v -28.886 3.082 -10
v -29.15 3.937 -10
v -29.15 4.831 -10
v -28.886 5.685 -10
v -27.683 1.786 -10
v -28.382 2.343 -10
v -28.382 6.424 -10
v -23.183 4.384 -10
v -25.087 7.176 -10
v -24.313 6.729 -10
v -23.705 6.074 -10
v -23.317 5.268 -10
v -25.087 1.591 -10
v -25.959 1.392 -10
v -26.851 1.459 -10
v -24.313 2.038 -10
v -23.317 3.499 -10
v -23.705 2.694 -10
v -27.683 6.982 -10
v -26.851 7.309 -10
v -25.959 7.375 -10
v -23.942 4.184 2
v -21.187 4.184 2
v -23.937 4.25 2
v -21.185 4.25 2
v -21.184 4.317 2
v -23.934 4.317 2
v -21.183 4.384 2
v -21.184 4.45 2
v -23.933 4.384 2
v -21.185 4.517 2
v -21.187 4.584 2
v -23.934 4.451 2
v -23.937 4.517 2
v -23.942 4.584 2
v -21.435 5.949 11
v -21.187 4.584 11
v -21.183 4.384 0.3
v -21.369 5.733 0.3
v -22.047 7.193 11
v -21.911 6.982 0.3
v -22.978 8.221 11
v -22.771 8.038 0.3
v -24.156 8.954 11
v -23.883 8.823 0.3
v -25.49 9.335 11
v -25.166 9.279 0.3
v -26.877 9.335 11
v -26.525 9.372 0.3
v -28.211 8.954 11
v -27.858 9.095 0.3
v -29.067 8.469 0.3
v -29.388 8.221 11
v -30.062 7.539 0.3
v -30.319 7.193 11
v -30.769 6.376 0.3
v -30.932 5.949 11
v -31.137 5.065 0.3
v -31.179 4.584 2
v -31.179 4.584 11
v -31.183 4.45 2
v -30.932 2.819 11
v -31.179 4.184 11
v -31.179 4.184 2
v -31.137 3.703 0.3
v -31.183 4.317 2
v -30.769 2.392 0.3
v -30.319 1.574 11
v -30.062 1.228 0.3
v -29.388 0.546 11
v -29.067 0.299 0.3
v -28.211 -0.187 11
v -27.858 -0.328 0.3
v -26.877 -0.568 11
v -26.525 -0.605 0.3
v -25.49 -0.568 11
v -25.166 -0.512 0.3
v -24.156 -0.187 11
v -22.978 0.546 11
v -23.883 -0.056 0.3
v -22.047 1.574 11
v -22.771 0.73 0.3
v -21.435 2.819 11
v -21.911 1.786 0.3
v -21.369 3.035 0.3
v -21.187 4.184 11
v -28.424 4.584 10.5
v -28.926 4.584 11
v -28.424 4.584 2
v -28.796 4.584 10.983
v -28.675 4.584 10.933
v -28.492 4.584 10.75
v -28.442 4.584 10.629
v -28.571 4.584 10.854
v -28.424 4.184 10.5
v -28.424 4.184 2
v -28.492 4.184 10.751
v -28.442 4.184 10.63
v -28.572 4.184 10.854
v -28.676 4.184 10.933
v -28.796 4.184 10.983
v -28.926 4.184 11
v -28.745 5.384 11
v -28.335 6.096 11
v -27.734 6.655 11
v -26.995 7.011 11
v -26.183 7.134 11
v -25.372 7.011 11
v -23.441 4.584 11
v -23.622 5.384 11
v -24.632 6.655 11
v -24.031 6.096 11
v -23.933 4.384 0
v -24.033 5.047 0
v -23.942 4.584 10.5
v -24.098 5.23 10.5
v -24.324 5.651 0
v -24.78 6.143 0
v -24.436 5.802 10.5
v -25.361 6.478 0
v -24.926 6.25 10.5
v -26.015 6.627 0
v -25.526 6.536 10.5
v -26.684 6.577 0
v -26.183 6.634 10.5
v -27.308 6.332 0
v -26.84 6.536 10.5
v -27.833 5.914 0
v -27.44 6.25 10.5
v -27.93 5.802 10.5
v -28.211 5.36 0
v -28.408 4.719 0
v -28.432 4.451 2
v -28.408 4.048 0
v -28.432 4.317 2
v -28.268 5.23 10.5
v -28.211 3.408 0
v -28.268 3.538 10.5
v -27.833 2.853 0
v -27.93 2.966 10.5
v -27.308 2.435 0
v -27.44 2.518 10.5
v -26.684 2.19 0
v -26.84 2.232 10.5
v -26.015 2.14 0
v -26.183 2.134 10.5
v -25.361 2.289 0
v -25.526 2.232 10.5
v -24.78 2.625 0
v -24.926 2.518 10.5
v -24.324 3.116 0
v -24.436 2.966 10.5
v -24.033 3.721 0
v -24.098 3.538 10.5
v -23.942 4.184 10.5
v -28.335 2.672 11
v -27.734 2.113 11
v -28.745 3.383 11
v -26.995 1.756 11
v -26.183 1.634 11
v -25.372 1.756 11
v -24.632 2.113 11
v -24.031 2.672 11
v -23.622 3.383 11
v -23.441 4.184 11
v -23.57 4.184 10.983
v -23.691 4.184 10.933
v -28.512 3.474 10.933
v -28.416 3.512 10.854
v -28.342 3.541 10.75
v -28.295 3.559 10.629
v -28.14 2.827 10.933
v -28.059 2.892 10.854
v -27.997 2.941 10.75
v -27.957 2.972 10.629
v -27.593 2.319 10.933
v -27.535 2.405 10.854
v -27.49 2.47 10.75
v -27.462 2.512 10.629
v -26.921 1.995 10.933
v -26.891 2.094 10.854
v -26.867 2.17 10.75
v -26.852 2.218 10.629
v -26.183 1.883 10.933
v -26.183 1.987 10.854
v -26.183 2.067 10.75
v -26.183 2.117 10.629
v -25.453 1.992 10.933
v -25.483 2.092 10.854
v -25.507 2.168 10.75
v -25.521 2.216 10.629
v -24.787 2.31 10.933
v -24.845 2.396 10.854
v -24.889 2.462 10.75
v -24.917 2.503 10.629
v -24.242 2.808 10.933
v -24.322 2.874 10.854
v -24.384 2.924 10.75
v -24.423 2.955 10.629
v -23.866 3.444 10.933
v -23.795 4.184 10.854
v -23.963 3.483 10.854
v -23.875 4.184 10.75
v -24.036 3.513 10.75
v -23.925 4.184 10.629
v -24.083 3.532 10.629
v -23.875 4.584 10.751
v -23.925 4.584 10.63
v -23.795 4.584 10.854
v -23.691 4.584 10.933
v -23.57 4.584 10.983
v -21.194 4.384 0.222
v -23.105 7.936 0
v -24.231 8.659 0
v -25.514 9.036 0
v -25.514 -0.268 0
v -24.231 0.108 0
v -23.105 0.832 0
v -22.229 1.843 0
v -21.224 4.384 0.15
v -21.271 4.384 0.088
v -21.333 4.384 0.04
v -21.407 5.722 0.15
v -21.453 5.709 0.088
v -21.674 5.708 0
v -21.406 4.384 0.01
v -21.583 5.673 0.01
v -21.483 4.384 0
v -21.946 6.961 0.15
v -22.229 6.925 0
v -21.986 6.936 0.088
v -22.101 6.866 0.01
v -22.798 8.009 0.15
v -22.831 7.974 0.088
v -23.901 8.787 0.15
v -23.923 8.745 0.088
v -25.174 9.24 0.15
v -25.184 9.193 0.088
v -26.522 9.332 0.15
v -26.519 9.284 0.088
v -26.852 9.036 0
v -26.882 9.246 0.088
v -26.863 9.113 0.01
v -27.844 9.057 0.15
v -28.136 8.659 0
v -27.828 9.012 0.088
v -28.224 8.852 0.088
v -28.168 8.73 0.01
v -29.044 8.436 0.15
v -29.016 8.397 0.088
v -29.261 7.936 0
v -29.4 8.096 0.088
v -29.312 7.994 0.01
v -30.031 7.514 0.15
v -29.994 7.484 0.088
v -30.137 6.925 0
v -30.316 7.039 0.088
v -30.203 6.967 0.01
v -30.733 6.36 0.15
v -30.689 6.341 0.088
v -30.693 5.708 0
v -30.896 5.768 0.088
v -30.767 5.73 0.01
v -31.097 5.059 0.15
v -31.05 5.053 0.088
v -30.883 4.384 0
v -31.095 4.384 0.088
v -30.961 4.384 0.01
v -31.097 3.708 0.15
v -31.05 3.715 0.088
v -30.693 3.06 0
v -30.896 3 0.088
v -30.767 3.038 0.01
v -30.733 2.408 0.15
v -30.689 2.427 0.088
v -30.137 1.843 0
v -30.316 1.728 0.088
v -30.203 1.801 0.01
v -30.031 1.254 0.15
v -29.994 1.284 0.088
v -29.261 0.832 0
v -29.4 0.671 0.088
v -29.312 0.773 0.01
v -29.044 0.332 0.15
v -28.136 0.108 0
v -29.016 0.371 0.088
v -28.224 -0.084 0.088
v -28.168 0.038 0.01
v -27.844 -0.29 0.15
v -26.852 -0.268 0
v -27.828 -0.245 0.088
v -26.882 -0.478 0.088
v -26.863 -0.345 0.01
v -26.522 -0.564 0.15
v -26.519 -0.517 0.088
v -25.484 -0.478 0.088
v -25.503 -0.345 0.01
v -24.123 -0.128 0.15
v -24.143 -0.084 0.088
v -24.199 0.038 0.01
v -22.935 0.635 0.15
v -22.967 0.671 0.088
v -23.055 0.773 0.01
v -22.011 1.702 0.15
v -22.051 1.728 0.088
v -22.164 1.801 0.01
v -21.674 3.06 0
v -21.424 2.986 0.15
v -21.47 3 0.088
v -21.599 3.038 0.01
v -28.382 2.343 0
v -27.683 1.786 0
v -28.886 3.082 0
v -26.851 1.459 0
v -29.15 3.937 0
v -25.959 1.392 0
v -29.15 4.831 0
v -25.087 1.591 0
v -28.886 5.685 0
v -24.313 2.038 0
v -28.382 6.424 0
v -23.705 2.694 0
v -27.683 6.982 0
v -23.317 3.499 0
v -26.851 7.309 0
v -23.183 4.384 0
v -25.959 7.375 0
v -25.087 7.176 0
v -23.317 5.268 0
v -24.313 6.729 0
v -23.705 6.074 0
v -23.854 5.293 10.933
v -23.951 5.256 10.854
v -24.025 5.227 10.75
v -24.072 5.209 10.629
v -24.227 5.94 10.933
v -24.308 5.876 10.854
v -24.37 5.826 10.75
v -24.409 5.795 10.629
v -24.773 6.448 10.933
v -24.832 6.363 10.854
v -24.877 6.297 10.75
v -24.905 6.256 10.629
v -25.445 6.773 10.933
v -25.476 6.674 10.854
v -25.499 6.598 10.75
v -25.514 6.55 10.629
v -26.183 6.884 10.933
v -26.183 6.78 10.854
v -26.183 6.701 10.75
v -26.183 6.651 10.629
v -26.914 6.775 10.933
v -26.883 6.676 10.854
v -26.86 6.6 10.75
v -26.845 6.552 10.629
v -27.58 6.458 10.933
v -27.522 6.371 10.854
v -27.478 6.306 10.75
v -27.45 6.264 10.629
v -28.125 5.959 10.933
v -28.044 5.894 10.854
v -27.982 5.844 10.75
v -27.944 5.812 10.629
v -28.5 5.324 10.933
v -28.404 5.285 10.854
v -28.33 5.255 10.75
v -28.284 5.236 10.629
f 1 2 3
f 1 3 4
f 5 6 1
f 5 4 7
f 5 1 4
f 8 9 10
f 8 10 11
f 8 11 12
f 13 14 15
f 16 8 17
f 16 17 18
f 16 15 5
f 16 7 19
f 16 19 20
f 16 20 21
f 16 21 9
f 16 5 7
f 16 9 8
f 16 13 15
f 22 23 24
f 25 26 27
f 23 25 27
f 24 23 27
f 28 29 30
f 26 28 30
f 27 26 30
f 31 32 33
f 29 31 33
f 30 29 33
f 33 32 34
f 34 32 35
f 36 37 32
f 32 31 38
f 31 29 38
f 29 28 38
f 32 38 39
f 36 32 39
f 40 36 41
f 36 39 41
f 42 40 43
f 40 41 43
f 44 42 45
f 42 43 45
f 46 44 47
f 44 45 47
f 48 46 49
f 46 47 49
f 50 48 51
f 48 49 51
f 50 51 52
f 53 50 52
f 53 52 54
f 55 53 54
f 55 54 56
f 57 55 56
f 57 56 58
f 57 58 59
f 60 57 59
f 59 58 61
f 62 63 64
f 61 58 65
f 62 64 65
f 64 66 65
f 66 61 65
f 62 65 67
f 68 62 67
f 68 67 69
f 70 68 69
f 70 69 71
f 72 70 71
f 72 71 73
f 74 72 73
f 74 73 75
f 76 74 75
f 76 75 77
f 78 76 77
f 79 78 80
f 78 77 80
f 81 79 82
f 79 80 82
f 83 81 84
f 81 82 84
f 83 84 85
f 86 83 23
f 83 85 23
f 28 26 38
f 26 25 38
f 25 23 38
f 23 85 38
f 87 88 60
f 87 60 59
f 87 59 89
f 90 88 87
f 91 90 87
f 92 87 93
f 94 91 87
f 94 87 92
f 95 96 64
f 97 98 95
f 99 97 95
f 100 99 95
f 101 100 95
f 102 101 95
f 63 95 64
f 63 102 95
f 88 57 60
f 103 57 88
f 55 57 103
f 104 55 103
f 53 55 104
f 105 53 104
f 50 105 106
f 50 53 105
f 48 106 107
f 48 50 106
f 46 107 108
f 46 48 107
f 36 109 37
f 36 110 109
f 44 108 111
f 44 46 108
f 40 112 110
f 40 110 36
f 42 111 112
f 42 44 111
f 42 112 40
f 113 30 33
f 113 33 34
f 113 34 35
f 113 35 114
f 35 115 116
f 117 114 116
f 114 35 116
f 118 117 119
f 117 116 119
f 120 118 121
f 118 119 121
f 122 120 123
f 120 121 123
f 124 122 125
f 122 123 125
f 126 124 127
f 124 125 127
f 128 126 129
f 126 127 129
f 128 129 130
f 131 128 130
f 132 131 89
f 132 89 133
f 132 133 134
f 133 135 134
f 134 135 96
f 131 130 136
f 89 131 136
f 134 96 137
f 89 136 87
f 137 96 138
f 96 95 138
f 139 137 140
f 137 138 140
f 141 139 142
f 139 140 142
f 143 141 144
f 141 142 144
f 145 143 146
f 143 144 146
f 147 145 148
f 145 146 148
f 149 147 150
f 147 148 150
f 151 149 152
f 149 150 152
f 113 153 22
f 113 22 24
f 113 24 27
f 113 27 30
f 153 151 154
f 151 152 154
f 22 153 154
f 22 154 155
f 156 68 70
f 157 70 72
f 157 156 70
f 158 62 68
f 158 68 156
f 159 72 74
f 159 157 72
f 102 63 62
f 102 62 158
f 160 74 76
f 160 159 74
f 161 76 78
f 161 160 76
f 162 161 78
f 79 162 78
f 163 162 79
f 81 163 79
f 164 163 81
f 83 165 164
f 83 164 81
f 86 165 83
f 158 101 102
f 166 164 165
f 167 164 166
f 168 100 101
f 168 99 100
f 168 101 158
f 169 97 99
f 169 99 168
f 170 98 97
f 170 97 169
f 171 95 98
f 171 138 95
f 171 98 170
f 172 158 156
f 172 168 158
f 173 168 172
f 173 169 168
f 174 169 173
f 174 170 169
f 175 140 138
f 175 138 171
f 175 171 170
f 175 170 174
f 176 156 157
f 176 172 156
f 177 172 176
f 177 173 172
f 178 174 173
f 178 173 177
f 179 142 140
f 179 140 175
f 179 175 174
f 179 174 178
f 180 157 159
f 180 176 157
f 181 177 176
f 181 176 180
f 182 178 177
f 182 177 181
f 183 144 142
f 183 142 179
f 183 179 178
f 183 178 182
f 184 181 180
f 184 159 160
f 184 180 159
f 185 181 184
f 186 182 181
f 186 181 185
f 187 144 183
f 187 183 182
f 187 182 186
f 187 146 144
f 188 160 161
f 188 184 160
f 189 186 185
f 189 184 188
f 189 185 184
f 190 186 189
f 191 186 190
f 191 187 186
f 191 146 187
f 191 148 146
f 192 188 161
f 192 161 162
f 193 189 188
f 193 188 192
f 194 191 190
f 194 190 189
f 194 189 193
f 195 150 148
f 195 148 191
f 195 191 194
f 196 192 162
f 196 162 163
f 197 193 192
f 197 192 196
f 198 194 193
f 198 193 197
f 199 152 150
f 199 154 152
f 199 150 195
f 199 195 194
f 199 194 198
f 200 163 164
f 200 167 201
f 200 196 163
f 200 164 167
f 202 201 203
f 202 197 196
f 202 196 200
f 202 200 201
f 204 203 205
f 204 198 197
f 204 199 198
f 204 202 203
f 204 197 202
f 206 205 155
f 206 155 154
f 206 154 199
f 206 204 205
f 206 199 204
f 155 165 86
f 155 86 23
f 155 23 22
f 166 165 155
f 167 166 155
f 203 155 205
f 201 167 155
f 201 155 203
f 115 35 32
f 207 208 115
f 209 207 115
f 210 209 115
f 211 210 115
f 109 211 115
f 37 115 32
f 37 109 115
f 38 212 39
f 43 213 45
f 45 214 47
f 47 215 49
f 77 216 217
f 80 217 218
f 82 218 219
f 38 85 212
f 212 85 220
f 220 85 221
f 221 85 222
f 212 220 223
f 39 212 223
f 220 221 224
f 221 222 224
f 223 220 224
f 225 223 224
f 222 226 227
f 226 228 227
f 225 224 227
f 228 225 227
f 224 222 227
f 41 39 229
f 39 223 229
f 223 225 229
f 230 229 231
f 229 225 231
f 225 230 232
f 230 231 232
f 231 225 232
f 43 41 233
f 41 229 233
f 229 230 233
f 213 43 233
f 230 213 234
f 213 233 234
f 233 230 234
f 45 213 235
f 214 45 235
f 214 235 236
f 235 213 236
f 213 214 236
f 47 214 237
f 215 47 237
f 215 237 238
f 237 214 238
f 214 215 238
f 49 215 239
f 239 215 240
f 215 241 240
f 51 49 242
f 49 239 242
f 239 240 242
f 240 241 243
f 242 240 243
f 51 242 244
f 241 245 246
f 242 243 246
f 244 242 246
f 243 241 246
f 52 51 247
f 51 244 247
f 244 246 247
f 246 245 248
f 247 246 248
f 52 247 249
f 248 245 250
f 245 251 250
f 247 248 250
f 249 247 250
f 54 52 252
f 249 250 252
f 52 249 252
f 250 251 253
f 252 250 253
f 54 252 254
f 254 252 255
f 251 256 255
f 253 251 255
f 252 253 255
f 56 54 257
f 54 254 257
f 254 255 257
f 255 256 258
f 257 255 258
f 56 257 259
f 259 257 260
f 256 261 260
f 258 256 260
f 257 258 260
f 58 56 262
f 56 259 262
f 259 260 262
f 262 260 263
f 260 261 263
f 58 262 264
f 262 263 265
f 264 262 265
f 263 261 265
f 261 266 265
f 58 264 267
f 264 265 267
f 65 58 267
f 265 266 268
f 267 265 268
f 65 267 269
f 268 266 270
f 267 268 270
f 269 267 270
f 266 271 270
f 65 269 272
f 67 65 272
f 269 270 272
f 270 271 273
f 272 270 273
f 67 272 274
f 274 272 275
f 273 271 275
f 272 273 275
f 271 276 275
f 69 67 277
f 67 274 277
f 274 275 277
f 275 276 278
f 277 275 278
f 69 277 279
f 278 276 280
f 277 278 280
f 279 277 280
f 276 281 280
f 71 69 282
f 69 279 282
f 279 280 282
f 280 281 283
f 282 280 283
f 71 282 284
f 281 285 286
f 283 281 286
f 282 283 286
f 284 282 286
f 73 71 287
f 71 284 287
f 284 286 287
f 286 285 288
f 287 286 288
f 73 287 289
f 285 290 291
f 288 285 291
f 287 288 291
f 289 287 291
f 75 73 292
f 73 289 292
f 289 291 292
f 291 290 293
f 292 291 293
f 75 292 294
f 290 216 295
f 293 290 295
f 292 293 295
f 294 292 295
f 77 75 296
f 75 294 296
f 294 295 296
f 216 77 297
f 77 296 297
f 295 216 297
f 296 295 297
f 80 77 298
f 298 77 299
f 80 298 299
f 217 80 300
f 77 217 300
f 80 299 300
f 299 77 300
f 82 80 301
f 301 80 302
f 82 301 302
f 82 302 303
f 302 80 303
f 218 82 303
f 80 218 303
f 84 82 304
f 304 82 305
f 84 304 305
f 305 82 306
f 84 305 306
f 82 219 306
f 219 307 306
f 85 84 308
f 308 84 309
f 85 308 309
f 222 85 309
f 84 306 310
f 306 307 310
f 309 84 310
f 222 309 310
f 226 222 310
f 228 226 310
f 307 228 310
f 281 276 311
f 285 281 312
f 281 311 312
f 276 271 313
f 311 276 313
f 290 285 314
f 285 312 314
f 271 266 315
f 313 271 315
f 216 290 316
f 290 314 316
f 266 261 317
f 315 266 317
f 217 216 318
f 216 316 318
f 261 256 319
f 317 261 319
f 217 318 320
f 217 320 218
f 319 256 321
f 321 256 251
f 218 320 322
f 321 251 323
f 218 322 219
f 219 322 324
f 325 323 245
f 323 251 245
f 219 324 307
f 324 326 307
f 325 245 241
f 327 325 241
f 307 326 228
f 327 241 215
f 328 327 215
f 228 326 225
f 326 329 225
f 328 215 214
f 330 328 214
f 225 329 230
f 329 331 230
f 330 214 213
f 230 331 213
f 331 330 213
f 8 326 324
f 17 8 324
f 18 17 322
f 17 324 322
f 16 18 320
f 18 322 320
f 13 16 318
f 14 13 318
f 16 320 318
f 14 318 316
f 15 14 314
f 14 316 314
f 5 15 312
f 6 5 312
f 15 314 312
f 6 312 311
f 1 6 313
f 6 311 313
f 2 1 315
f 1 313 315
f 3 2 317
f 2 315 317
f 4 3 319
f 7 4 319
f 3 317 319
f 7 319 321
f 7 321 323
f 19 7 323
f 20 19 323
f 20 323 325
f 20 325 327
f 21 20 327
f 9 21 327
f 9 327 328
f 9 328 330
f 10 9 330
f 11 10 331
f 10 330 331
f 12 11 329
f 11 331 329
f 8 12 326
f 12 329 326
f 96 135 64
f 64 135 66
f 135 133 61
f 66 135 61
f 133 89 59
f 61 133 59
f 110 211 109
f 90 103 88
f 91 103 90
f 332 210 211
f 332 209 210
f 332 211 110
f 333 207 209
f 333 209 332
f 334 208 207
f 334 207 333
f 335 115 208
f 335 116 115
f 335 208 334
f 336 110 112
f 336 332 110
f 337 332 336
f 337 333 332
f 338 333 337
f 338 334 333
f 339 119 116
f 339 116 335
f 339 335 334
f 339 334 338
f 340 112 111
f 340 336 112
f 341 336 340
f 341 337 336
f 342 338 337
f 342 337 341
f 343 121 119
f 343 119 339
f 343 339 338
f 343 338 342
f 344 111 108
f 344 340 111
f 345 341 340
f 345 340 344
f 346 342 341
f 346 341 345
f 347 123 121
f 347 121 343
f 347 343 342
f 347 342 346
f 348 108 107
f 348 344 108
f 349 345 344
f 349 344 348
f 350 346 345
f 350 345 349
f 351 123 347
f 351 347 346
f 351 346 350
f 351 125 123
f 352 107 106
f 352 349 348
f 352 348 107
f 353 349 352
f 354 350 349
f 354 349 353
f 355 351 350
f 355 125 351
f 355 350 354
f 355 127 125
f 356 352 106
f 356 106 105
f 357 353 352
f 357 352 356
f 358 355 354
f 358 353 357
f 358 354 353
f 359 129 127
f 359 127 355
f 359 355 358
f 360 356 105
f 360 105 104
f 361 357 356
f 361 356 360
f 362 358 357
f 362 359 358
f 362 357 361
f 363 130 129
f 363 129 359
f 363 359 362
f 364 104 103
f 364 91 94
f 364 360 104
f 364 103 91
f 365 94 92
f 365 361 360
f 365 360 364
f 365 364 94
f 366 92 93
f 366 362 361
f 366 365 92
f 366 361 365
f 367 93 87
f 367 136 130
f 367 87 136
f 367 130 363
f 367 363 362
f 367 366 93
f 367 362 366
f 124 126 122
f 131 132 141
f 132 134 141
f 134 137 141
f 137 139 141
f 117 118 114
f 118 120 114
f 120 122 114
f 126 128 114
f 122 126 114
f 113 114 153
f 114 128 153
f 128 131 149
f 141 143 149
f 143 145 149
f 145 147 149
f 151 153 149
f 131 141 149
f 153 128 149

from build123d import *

# Parameters (mm, degrees)
ESBO_O1_R                = 5
RESSALTO_EXTRUS_O1_DEPTH = 11
ESBO_O2_R                = 2.25
CORTE_EXTRUS_O1_DEPTH    = 11
ESBO_O3_R                = 3
RESSALTO_EXTRUS_O2_DEPTH = 10
CORTE_EXTRUS_O2_DEPTH    = 9
FILETE1_R                = 0.5
FILETE2_R                = 0.3


with BuildPart() as part:
    # Esboço1 → Ressalto-extrusão1 (new body)
    with BuildSketch(Plane.XY):
        with Locations((-26.183327478, 4.383756345)):
            Circle(ESBO_O1_R)
    extrude(amount=RESSALTO_EXTRUS_O1_DEPTH)

    # Esboço2 → Corte-extrusão1 (cut)
    with BuildSketch(Plane.XY.offset(11)):
        with Locations((-26.183327478, 4.383756345)):
            Circle(ESBO_O2_R)
    extrude(amount=-CORTE_EXTRUS_O1_DEPTH, mode=Mode.SUBTRACT)

    # Esboço3 → Ressalto-extrusão2 (add)
    with BuildSketch(Plane(origin=(0, 0, 0), x_dir=(-1, 0, 0), z_dir=(0, 0, -1))):
        with Locations(Location((26.183327478, 4.383756345, 0), (0, 0, 180))):
            Circle(ESBO_O3_R)
    extrude(amount=RESSALTO_EXTRUS_O2_DEPTH)

    # Esboço4 → Corte-extrusão2 (cut)
    with BuildSketch(Plane.XY.offset(11)):
        with BuildLine():
            Line((-31.183327478, 4.583756345), (-21.183327478, 4.583756345))
            ThreePointArc((-21.183327478, 4.583756345), (-20.983327478, 4.383756345), (-21.183327478, 4.183756345))
            Line((-21.183327478, 4.183756345), (-31.183327478, 4.183756345))
            ThreePointArc((-31.183327478, 4.183756345), (-31.383327478, 4.383756345), (-31.183327478, 4.583756345))
        make_face()
    extrude(amount=-CORTE_EXTRUS_O2_DEPTH, mode=Mode.SUBTRACT)

    # Filete1
    filete1_edges = [part.edges().sort_by_distance(p)[0] for p in [
        (-26.183327478, 2.133756345, 11),
        (-26.183327478, 6.633756345, 11),
    ]]
    fillet(filete1_edges, radius=FILETE1_R)

    # Filete2
    filete2_edges = [part.edges().sort_by_distance(p)[0] for p in [
        (-31.183327478, 4.383756345, 0),
    ]]
    fillet(filete2_edges, radius=FILETE2_R)


solid = part.part
